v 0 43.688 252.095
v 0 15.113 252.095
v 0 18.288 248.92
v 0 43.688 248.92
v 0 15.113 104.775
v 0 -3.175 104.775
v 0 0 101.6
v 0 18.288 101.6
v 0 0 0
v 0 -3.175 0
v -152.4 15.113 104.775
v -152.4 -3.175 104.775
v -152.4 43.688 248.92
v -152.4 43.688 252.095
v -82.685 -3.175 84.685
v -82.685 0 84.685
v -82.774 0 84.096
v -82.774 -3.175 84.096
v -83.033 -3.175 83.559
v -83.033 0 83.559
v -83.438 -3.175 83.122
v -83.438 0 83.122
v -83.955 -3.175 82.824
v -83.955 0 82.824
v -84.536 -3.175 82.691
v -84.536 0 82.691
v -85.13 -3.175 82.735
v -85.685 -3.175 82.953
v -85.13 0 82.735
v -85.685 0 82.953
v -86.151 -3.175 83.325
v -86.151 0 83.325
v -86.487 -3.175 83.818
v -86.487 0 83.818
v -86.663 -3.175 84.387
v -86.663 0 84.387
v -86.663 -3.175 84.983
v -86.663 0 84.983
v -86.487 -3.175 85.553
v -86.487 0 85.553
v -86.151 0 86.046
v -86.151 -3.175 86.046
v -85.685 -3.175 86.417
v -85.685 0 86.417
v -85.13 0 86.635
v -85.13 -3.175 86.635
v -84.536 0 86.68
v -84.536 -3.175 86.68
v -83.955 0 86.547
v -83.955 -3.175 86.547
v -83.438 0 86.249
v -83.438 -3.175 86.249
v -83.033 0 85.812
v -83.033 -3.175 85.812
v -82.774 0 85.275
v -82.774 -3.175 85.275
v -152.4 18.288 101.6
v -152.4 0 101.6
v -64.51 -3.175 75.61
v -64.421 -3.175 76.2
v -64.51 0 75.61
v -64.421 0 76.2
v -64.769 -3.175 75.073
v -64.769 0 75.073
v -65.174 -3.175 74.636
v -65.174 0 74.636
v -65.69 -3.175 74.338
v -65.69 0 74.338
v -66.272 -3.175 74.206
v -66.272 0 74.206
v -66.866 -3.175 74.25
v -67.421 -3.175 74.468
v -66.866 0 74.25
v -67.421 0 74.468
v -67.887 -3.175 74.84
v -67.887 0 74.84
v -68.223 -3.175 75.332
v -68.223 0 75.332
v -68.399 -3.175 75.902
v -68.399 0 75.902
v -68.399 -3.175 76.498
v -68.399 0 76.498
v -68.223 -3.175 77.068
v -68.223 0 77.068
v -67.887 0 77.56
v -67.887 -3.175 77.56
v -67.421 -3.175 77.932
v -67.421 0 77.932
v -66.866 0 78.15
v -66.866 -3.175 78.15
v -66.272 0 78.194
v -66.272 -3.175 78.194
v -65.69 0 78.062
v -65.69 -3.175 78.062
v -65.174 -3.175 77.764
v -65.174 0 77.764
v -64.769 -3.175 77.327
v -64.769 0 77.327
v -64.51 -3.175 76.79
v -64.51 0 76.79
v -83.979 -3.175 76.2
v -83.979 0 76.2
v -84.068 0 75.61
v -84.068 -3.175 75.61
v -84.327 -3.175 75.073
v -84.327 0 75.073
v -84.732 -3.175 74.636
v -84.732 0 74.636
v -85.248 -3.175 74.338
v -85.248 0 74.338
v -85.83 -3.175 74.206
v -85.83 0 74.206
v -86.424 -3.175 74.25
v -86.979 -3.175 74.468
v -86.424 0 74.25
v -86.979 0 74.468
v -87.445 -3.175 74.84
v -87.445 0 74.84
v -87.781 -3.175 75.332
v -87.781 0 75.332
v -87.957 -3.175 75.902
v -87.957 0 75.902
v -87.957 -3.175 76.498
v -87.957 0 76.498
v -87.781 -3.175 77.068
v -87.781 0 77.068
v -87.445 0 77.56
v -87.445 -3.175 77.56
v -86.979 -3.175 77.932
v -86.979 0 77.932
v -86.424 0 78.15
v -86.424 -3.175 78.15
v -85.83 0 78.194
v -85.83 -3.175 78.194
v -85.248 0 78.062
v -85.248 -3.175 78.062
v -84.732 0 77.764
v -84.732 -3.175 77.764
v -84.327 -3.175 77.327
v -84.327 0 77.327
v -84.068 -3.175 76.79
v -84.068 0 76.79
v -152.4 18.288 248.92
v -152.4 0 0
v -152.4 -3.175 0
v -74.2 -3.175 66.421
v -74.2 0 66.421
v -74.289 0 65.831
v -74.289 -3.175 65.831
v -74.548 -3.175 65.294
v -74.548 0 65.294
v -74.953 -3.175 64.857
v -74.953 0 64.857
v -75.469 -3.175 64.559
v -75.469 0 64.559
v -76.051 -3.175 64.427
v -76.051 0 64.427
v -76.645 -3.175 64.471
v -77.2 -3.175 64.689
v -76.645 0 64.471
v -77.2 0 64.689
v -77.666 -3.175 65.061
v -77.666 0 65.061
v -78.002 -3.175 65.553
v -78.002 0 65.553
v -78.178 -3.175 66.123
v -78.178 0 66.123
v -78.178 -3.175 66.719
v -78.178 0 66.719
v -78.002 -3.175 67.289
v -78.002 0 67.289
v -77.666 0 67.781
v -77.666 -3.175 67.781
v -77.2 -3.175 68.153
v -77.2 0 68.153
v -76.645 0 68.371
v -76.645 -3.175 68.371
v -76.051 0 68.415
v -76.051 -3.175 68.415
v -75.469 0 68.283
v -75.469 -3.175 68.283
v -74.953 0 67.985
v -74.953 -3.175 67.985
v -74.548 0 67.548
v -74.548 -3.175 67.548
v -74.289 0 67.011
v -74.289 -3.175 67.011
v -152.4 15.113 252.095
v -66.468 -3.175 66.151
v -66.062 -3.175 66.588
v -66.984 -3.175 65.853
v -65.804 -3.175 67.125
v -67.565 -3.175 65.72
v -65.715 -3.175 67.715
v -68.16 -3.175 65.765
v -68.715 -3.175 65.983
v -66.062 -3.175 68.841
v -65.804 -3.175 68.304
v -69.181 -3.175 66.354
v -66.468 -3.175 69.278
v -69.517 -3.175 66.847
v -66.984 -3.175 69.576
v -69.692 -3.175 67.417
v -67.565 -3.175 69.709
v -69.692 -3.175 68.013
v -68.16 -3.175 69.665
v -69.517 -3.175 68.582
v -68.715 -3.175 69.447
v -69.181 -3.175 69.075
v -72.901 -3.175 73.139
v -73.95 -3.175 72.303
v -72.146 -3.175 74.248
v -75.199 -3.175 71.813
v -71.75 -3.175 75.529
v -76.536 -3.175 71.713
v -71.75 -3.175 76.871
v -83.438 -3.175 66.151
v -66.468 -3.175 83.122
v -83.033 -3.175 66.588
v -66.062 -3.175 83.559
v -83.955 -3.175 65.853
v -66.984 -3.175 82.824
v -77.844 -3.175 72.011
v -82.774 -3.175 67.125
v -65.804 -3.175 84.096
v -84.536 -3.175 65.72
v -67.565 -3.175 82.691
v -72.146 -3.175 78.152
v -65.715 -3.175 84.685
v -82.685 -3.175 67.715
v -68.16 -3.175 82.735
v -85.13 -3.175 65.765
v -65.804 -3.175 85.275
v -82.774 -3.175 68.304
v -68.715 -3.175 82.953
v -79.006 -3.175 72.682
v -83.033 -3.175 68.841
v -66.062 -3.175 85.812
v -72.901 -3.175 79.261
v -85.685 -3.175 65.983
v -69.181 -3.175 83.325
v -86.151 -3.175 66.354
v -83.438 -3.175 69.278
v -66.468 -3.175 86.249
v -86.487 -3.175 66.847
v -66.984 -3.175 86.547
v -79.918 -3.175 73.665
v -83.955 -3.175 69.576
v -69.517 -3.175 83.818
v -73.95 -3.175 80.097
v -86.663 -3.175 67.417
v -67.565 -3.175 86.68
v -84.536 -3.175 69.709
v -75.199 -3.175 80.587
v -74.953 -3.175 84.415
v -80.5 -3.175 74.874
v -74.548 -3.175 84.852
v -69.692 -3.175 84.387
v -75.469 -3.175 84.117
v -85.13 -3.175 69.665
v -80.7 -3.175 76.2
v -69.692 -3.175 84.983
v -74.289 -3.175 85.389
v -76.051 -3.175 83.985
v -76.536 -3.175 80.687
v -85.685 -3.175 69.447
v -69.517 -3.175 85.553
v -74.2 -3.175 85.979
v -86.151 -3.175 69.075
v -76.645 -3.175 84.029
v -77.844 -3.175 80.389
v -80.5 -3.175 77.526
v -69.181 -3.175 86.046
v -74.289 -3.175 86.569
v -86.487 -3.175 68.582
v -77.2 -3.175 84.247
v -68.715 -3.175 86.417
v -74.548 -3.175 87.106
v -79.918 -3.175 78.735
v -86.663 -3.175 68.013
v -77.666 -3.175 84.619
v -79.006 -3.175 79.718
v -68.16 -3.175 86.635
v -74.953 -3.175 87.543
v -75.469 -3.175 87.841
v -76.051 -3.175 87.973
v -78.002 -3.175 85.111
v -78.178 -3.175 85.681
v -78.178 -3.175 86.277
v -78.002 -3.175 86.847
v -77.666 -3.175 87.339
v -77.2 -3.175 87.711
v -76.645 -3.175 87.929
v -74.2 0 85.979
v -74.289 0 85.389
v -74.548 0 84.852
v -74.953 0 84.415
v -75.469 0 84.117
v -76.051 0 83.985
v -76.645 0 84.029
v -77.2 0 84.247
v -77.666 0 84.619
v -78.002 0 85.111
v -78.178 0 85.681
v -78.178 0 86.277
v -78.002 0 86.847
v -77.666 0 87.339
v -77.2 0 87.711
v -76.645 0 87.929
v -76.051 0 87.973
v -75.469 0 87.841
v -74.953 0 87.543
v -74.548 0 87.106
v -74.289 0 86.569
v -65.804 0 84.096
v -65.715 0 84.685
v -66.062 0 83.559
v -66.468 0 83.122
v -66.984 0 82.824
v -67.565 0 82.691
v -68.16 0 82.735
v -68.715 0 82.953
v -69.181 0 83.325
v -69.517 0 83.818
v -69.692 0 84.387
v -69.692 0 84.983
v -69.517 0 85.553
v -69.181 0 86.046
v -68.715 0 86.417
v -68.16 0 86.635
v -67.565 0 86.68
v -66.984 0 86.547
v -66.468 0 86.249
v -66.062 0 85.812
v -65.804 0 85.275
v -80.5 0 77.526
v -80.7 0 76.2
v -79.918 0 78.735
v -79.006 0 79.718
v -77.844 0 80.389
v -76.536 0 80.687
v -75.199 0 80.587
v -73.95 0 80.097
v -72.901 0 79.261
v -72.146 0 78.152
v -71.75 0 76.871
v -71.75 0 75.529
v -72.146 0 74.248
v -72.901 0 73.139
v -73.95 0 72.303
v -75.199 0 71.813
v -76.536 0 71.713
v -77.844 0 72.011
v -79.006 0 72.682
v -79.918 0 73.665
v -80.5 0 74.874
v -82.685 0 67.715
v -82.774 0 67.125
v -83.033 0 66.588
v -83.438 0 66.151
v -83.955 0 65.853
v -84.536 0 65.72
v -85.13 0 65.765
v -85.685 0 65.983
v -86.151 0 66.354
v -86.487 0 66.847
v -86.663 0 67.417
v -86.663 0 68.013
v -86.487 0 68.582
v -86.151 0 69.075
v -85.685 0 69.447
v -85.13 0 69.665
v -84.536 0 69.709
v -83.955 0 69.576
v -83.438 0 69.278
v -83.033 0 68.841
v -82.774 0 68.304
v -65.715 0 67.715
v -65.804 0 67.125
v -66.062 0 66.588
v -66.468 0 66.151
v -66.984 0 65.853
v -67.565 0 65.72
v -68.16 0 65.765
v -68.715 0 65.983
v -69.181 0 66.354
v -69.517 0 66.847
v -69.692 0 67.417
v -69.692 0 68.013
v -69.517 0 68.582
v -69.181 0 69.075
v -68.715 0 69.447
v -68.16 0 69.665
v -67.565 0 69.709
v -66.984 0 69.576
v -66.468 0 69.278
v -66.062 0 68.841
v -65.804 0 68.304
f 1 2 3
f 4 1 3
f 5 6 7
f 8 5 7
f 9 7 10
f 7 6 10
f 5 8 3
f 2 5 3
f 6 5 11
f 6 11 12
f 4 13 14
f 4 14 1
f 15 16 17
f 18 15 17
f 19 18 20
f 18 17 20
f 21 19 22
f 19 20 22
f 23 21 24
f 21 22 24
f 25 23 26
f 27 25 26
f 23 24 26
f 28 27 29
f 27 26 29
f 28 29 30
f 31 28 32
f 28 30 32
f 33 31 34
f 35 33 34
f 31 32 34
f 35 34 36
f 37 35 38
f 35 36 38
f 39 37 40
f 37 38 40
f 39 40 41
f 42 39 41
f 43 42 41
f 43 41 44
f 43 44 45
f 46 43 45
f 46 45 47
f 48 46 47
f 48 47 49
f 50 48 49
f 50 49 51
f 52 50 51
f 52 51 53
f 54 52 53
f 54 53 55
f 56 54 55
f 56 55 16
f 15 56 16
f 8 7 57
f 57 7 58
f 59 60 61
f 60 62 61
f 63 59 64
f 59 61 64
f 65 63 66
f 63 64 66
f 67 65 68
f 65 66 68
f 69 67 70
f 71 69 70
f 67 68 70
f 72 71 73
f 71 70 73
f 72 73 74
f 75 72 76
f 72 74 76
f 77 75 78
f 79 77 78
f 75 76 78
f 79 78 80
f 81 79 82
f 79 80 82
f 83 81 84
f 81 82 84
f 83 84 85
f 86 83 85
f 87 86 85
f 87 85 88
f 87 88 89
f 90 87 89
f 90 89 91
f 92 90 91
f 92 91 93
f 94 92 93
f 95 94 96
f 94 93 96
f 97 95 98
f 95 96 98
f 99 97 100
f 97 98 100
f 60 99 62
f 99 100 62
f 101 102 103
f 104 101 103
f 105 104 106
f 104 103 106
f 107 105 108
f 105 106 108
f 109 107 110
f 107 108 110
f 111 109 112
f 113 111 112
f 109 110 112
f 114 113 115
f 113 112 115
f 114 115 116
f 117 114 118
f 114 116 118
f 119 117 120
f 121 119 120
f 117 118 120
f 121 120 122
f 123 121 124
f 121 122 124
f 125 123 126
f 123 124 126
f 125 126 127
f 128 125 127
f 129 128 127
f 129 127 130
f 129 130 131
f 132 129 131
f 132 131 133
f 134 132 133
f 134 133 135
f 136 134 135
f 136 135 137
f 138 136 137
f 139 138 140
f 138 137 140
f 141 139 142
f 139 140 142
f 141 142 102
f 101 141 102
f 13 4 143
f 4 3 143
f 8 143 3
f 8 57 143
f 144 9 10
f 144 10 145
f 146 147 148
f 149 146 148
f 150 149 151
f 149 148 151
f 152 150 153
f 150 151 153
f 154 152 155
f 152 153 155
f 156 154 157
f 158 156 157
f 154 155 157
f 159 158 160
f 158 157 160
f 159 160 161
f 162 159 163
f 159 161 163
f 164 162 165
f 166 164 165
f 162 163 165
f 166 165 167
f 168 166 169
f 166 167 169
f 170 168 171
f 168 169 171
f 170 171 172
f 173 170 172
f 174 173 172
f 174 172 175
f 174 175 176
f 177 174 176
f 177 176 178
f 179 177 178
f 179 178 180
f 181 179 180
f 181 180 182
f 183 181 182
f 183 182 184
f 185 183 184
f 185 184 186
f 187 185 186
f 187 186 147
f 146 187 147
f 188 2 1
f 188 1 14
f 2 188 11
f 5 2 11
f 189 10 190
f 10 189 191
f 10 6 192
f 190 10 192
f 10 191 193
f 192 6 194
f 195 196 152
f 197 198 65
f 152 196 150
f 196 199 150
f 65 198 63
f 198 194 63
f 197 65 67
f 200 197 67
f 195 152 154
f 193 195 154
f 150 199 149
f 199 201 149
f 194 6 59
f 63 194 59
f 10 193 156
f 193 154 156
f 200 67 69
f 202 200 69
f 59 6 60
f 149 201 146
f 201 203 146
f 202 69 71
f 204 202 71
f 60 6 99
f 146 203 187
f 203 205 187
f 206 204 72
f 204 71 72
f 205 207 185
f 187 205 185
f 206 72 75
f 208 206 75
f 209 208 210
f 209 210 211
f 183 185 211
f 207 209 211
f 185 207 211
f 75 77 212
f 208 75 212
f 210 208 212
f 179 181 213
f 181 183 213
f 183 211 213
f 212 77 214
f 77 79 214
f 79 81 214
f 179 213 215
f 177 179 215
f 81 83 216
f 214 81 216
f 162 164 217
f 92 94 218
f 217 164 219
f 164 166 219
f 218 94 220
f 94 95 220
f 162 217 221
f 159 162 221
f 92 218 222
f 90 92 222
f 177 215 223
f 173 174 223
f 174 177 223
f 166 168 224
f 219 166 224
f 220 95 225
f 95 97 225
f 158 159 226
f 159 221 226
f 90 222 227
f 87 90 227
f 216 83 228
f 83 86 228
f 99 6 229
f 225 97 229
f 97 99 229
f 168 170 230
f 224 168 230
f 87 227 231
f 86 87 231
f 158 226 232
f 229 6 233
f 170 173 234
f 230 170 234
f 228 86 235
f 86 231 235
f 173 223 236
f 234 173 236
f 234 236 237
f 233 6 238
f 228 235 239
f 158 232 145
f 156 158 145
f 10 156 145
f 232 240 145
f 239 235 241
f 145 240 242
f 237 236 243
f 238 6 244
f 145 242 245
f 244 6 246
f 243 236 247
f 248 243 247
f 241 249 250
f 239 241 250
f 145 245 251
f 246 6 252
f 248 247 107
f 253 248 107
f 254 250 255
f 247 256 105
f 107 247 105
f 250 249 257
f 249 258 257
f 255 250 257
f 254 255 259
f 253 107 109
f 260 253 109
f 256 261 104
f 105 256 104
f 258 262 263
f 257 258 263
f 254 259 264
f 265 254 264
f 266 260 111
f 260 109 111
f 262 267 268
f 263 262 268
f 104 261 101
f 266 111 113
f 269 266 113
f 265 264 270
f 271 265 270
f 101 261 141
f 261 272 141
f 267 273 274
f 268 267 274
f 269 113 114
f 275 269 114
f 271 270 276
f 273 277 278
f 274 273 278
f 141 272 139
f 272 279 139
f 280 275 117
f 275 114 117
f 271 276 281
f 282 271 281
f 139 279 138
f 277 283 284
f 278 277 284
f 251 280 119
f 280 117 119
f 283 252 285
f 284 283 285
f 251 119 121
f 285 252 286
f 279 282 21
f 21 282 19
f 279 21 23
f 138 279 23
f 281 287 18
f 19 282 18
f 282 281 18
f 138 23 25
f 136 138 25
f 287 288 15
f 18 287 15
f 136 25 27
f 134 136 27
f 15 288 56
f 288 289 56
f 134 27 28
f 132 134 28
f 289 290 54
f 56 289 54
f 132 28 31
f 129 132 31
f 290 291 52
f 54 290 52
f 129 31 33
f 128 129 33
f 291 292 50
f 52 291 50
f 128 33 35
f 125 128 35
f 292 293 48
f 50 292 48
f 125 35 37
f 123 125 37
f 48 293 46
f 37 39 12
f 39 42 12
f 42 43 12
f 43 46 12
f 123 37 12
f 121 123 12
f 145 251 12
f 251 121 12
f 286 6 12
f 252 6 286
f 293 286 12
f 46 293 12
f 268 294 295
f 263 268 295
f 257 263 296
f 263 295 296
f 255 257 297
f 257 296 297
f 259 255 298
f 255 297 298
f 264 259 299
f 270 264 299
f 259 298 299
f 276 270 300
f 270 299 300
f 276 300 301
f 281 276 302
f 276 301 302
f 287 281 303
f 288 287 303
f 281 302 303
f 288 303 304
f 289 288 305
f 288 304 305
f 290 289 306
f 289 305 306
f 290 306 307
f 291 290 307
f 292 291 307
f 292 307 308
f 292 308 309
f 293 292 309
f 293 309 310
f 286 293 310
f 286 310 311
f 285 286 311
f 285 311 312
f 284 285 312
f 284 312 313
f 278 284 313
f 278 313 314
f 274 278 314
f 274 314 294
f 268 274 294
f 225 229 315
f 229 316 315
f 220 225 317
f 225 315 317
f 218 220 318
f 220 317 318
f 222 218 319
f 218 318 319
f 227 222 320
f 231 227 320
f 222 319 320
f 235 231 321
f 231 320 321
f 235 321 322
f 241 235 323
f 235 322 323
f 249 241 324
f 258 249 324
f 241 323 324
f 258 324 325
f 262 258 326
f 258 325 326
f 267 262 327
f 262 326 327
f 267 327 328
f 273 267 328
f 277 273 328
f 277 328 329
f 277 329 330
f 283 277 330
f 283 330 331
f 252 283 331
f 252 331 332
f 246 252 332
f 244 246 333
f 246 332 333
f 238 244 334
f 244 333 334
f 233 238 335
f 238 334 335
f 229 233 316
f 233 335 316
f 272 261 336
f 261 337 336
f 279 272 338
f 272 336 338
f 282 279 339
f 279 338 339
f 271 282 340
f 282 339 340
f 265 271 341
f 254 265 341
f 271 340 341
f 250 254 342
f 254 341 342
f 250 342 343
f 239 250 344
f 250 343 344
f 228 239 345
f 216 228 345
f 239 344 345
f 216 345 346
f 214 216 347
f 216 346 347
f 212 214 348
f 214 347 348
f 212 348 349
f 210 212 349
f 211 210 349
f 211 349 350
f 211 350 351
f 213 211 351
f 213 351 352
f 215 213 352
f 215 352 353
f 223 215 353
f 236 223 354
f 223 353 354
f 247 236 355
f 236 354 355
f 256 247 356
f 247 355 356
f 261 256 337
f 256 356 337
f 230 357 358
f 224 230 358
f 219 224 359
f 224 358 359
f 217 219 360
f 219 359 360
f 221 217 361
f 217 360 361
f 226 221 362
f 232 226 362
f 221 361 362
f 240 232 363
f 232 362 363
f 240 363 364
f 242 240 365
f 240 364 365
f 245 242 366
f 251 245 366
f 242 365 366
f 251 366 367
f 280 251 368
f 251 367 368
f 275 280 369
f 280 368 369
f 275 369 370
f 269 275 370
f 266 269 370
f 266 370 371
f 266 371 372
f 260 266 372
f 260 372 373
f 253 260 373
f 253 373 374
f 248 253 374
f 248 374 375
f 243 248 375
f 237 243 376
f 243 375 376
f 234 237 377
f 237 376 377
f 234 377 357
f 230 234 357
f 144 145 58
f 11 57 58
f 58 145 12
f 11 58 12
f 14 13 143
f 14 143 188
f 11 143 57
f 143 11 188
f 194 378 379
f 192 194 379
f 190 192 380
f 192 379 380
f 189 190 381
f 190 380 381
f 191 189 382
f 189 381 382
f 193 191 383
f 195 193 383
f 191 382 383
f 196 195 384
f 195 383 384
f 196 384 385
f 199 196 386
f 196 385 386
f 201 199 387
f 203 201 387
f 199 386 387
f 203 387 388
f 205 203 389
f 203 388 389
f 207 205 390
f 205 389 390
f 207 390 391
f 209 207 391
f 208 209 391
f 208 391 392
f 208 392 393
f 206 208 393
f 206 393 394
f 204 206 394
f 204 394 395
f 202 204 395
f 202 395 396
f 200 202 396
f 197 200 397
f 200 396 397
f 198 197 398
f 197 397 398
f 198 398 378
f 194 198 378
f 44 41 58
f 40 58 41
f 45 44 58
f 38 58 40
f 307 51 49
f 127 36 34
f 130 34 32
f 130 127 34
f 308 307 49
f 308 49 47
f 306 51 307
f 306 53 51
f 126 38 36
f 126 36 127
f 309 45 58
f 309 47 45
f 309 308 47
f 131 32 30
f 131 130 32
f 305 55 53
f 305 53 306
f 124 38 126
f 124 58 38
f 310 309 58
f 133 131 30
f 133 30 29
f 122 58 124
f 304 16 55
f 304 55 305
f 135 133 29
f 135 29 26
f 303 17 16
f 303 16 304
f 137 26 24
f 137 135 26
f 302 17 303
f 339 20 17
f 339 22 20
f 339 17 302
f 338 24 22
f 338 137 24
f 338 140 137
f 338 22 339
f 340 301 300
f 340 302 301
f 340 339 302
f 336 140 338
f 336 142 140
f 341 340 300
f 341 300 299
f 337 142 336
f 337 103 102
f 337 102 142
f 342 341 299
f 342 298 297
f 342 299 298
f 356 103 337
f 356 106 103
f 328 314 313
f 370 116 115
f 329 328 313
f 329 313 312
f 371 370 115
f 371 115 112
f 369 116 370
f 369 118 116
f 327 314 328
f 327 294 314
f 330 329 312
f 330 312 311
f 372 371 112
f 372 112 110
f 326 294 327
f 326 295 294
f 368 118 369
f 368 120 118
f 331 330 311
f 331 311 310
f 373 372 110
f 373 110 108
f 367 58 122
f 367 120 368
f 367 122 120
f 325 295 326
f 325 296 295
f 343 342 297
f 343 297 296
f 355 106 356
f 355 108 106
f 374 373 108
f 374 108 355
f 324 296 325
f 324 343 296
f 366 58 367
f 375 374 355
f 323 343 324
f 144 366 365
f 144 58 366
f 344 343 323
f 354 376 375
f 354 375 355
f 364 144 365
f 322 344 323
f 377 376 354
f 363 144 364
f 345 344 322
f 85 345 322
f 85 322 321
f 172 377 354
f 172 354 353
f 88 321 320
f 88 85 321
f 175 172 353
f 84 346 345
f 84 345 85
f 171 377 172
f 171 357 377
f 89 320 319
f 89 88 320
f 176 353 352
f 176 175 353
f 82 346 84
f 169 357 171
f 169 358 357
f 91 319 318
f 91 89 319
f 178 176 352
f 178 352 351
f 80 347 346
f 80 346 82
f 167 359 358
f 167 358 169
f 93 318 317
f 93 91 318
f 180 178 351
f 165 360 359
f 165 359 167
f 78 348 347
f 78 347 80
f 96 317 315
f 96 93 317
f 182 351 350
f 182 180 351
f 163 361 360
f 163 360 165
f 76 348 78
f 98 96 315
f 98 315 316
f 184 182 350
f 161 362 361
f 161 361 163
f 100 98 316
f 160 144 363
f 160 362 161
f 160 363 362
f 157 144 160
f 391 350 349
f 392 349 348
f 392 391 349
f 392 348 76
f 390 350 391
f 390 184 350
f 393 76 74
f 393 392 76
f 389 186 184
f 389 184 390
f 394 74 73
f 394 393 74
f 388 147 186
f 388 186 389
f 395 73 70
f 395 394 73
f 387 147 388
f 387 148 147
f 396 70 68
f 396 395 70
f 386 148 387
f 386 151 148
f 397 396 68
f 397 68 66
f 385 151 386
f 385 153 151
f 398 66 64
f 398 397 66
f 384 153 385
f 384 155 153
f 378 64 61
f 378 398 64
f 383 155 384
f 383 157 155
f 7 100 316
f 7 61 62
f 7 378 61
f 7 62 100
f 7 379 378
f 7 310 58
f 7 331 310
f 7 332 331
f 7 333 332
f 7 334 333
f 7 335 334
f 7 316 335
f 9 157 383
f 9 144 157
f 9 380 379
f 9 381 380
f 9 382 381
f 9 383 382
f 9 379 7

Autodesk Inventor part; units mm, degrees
ref_plane "YZ Plane" through (0, 0, 0) normal (1, 0, 0) x (0, 1, 0)
ref_plane "XZ Plane" through (0, 0, 0) normal (0, 1, 0) x (-1, 0, 0)
ref_plane "XY Plane" through (0, 0, 0) normal (0, 0, 1) x (1, 0, 0)
sketch "Sketch1" plane through (0, 0, 0) normal (0, 1, 0) x (-1, 0, 0)
  line L0 (0, 0) -> (152.4, 0)
  line L1 (152.4, 0) -> (152.4, 252.095)
  line L2 (152.4, 252.095) -> (0, 252.095)
  line L3 (0, 252.095) -> (0, 0)
  circle A0 centre (76.2, 76.2) radius 50.8
  circle A1 centre (76.2, 76.2) radius 4.5
  dimension "d0" = 152.4
  dimension "d1" = 252.095
  dimension "d2" = 101.6
  dimension "d3" = 9
extrude "Extrusion1" add sketch "Sketch1" against normal blind 3.175 contours L3 L2 L1 L0 | A0
sketch "Sketch2" plane through (0, 0, 0) normal (0, 1, 0) x (1, 0, 0)
  line L0 (0, -252.095) -> (-152.4, -252.095) projected
  line L1 (-152.4, -252.095) -> (-152.4, 0) projected
  line L2 (0, -252.095) -> (-152.4, -252.095)
  line L3 (-152.4, -252.095) -> (-152.4, -248.92)
  line L4 (-152.4, -248.92) -> (0, -248.92)
  line L5 (0, -248.92) -> (0, -252.095)
  point P0 (0, 0)
  dimension "d6" = 3.175
extrude "Extrusion2" add sketch "Sketch2" along normal blind 25.4
sketch "Sketch3" plane through (0, 0, 0) normal (0, 1, 0) x (1, 0, 0)
  circle A0 centre (-66.421, -76.2) radius 2
  circle A1 centre (-85.979, -76.2) radius 2
  circle A2 centre (-76.2, -66.421) radius 2
  circle A3 centre (-76.2, -85.979) radius 2
  point P0 (0, 0)
  dimension "d9" = 4
  dimension "d10" = 4
  dimension "d11" = 4
  dimension "d12" = 4
extrude "Extrusion3" cut sketch "Sketch3" against normal blind 25.4
sketch "Sketch4" plane through (0, 0, 0) normal (0, 1, 0) x (1, 0, 0)
  circle A0 centre (-76.2, -85.979) radius 2 projected
  circle A1 centre (-76.2, -85.979) radius 2
  circle A2 centre (-76.2, -76.2) radius 4.5 projected
  circle A3 centre (-76.2, -76.2) radius 4.5
  circle A4 centre (-83.1148, -83.1148) radius 2
  circle A5 centre (-76.2, -76.2) radius 4.5
  circle A6 centre (-85.979, -76.2) radius 2
  circle A7 centre (-76.2, -76.2) radius 4.5
  circle A8 centre (-83.1148, -69.2852) radius 2
  circle A9 centre (-76.2, -76.2) radius 4.5
  circle A10 centre (-76.2, -66.421) radius 2
  circle A11 centre (-76.2, -76.2) radius 4.5
  circle A12 centre (-69.2852, -69.2852) radius 2
  circle A13 centre (-76.2, -76.2) radius 4.5
  circle A14 centre (-66.421, -76.2) radius 2
  circle A15 centre (-76.2, -76.2) radius 4.5
  circle A16 centre (-69.2852, -83.1148) radius 2
  circle A17 centre (-76.2, -76.2) radius 4.5
  point P0 (0, 0)
  dimension "d17" = 360
extrude "Extrusion4" cut sketch "Sketch4" against normal blind 25.4 contours A4 | A8 | A12 | A16
sketch "Sketch5" plane through (0, 0, 0) normal (0, 1, 0) x (1, 0, 0)
  point P0 (0, 0)
sketch "Sketch6" plane through (0, 0, 0) normal (0, 1, 0) x (1, 0, 0)
  point P0 (0, 0)
sketch "Sketch7" plane through (0, -3.175, 0) normal (0, -1, 0) x (1, 0, 0)
  circle A0 centre (-83.1148, 83.1148) radius 2 projected
  circle A1 centre (-83.1148, 83.1148) radius 2.8284
  circle A2 centre (-83.1148, 69.2852) radius 2 projected
  circle A3 centre (-83.1148, 69.2852) radius 2.8284
  circle A4 centre (-69.2852, 69.2852) radius 2 projected
  circle A5 centre (-69.2852, 69.2852) radius 2.9799
  circle A6 centre (-69.2852, 83.1148) radius 29.4992
  circle A7 centre (-69.2852, 83.1148) radius 2 projected
  circle A8 centre (-69.2852, 83.1148) radius 3.4641
  point P0 (0, 0)
extrude "Extrusion5" add sketch "Sketch7" against normal blind 3.175 contours A0 | A1 | A2 | A3 | A4 | A5 | A7 | A8
sketch "Sketch8" plane through (0, 0, 0) normal (0, 1, 0) x (1, 0, 0)
  circle A0 centre (-76.2, -76.2) radius 4.5 projected
  circle A1 centre (-76.2, -76.2) radius 4.5
  circle A2 centre (-64.2, -76.2) radius 2
  circle A3 centre (-76.2, -76.2) radius 4.5
  circle A4 centre (-76.2, -76.2) radius 4.5
  circle A5 centre (-76.2, -76.2) radius 4.5
  circle A6 centre (-76.2, -76.2) radius 4.5
  circle A7 centre (-76.2, -76.2) radius 4.5
  circle A8 centre (-76.2, -76.2) radius 4.5
  circle A9 centre (-76.2, -76.2) radius 4.5
  circle A10 centre (-67.7147, -84.6853) radius 2
  circle A11 centre (-84.6853, -84.6853) radius 2
  circle A12 centre (-84.6853, -67.7147) radius 2
  circle A13 centre (-67.7147, -67.7147) radius 2
  point P0 (0, 0)
  point P1 (-76.2, -64.2)
  point P2 (-88.2, -76.2)
  point P3 (-76.2, -88.2)
  dimension "d23" = 4
  dimension "d26" = 360
  dimension "d28" = 4
  dimension "d29" = 4
  dimension "d30" = 4
  dimension "d31" = 4
extrude "Extrusion6" cut sketch "Sketch8" against normal blind 25.4 contours A10 | A11 | A12 | A13
sketch "Sketch9" plane through (0, 25.4, 0) normal (0, 1, 0) x (1, 0, 0)
  line L0 (0, -248.92) -> (0, 0) projected
  line L1 (-163.9684, -278.6073) -> (0, -278.6073)
  line L2 (0, -278.6073) -> (0, -205.6552)
  line L3 (0, -205.6552) -> (-163.9684, -205.6552)
  line L4 (-163.9684, -205.6552) -> (-163.9684, -278.6073)
extrude "Extrusion7" cut sketch "Sketch9" against normal blind 25.4
sketch "Sketch10" plane through (0, 0, 0) normal (0, 1, 0) x (1, 0, 0)
  line L0 (-152.4, -252.095) -> (-152.4, 0) projected
  line L1 (0, -101.6) -> (-152.4, -101.6)
  line L2 (-152.4, -101.6) -> (-152.4, -252.095)
  line L3 (-152.4, -252.095) -> (0, -252.095)
  line L4 (0, -252.095) -> (0, -101.6)
  point P0 (0, 0)
extrude "Extrusion8" add sketch "Sketch10" along normal blind 18.288
sketch "Sketch11" plane through (0, 18.288, 0) normal (0, 1, 0) x (1, 0, 0)
  point P0 (0, 0)
sketch "Sketch12" plane through (0, 18.288, 0) normal (0, 1, 0) x (1, 0, 0)
  line L0 (0, -252.095) -> (-152.4, -252.095) projected
  line L1 (-152.4, -252.095) -> (0, -252.095)
  line L2 (0, -252.095) -> (0, -248.92)
  line L3 (0, -248.92) -> (-152.4, -248.92)
  line L4 (-152.4, -248.92) -> (-152.4, -252.095)
  point P0 (0, 0)
  dimension "d38" = 3.175
extrude "Extrusion9" add sketch "Sketch12" along normal blind 25.4
sketch "Sketch13" plane through (0, -3.175, 252.095) normal (1, 0, 0) x (0, 0, -1)
  line L0 (150.495, 3.175) -> (150.495, 21.463) projected
  line L1 (0, 0) -> (0, 46.863) projected
  line L2 (150.495, 21.463) -> (0, 21.463)
  line L3 (0, 21.463) -> (0, 18.288)
  line L4 (0, 18.288) -> (150.495, 18.288)
  line L5 (150.495, 18.288) -> (150.495, 21.463)
  line L6 (252.095, 0) -> (0, 0) projected
  line L7 (150.495, 21.463) -> (147.32, 21.463)
  line L8 (147.32, 21.463) -> (147.32, 0)
  line L9 (147.32, 0) -> (150.495, 0)
  line L10 (150.495, 0) -> (150.495, 21.463)
  line L11 (0, 18.288) -> (147.32, 18.288)
  line L12 (147.32, 18.288) -> (147.32, 0)
  line L13 (147.32, 0) -> (0, 0)
  line L14 (0, 0) -> (0, 18.288)
  point P0 (252.095, 3.175)
  dimension "d41" = 3.175
  dimension "d42" = 3.175
extrude "Extrusion10" cut sketch "Sketch13" against normal blind 254 contours L8 L6 L1 L4
properties part number "Single Sided board"
